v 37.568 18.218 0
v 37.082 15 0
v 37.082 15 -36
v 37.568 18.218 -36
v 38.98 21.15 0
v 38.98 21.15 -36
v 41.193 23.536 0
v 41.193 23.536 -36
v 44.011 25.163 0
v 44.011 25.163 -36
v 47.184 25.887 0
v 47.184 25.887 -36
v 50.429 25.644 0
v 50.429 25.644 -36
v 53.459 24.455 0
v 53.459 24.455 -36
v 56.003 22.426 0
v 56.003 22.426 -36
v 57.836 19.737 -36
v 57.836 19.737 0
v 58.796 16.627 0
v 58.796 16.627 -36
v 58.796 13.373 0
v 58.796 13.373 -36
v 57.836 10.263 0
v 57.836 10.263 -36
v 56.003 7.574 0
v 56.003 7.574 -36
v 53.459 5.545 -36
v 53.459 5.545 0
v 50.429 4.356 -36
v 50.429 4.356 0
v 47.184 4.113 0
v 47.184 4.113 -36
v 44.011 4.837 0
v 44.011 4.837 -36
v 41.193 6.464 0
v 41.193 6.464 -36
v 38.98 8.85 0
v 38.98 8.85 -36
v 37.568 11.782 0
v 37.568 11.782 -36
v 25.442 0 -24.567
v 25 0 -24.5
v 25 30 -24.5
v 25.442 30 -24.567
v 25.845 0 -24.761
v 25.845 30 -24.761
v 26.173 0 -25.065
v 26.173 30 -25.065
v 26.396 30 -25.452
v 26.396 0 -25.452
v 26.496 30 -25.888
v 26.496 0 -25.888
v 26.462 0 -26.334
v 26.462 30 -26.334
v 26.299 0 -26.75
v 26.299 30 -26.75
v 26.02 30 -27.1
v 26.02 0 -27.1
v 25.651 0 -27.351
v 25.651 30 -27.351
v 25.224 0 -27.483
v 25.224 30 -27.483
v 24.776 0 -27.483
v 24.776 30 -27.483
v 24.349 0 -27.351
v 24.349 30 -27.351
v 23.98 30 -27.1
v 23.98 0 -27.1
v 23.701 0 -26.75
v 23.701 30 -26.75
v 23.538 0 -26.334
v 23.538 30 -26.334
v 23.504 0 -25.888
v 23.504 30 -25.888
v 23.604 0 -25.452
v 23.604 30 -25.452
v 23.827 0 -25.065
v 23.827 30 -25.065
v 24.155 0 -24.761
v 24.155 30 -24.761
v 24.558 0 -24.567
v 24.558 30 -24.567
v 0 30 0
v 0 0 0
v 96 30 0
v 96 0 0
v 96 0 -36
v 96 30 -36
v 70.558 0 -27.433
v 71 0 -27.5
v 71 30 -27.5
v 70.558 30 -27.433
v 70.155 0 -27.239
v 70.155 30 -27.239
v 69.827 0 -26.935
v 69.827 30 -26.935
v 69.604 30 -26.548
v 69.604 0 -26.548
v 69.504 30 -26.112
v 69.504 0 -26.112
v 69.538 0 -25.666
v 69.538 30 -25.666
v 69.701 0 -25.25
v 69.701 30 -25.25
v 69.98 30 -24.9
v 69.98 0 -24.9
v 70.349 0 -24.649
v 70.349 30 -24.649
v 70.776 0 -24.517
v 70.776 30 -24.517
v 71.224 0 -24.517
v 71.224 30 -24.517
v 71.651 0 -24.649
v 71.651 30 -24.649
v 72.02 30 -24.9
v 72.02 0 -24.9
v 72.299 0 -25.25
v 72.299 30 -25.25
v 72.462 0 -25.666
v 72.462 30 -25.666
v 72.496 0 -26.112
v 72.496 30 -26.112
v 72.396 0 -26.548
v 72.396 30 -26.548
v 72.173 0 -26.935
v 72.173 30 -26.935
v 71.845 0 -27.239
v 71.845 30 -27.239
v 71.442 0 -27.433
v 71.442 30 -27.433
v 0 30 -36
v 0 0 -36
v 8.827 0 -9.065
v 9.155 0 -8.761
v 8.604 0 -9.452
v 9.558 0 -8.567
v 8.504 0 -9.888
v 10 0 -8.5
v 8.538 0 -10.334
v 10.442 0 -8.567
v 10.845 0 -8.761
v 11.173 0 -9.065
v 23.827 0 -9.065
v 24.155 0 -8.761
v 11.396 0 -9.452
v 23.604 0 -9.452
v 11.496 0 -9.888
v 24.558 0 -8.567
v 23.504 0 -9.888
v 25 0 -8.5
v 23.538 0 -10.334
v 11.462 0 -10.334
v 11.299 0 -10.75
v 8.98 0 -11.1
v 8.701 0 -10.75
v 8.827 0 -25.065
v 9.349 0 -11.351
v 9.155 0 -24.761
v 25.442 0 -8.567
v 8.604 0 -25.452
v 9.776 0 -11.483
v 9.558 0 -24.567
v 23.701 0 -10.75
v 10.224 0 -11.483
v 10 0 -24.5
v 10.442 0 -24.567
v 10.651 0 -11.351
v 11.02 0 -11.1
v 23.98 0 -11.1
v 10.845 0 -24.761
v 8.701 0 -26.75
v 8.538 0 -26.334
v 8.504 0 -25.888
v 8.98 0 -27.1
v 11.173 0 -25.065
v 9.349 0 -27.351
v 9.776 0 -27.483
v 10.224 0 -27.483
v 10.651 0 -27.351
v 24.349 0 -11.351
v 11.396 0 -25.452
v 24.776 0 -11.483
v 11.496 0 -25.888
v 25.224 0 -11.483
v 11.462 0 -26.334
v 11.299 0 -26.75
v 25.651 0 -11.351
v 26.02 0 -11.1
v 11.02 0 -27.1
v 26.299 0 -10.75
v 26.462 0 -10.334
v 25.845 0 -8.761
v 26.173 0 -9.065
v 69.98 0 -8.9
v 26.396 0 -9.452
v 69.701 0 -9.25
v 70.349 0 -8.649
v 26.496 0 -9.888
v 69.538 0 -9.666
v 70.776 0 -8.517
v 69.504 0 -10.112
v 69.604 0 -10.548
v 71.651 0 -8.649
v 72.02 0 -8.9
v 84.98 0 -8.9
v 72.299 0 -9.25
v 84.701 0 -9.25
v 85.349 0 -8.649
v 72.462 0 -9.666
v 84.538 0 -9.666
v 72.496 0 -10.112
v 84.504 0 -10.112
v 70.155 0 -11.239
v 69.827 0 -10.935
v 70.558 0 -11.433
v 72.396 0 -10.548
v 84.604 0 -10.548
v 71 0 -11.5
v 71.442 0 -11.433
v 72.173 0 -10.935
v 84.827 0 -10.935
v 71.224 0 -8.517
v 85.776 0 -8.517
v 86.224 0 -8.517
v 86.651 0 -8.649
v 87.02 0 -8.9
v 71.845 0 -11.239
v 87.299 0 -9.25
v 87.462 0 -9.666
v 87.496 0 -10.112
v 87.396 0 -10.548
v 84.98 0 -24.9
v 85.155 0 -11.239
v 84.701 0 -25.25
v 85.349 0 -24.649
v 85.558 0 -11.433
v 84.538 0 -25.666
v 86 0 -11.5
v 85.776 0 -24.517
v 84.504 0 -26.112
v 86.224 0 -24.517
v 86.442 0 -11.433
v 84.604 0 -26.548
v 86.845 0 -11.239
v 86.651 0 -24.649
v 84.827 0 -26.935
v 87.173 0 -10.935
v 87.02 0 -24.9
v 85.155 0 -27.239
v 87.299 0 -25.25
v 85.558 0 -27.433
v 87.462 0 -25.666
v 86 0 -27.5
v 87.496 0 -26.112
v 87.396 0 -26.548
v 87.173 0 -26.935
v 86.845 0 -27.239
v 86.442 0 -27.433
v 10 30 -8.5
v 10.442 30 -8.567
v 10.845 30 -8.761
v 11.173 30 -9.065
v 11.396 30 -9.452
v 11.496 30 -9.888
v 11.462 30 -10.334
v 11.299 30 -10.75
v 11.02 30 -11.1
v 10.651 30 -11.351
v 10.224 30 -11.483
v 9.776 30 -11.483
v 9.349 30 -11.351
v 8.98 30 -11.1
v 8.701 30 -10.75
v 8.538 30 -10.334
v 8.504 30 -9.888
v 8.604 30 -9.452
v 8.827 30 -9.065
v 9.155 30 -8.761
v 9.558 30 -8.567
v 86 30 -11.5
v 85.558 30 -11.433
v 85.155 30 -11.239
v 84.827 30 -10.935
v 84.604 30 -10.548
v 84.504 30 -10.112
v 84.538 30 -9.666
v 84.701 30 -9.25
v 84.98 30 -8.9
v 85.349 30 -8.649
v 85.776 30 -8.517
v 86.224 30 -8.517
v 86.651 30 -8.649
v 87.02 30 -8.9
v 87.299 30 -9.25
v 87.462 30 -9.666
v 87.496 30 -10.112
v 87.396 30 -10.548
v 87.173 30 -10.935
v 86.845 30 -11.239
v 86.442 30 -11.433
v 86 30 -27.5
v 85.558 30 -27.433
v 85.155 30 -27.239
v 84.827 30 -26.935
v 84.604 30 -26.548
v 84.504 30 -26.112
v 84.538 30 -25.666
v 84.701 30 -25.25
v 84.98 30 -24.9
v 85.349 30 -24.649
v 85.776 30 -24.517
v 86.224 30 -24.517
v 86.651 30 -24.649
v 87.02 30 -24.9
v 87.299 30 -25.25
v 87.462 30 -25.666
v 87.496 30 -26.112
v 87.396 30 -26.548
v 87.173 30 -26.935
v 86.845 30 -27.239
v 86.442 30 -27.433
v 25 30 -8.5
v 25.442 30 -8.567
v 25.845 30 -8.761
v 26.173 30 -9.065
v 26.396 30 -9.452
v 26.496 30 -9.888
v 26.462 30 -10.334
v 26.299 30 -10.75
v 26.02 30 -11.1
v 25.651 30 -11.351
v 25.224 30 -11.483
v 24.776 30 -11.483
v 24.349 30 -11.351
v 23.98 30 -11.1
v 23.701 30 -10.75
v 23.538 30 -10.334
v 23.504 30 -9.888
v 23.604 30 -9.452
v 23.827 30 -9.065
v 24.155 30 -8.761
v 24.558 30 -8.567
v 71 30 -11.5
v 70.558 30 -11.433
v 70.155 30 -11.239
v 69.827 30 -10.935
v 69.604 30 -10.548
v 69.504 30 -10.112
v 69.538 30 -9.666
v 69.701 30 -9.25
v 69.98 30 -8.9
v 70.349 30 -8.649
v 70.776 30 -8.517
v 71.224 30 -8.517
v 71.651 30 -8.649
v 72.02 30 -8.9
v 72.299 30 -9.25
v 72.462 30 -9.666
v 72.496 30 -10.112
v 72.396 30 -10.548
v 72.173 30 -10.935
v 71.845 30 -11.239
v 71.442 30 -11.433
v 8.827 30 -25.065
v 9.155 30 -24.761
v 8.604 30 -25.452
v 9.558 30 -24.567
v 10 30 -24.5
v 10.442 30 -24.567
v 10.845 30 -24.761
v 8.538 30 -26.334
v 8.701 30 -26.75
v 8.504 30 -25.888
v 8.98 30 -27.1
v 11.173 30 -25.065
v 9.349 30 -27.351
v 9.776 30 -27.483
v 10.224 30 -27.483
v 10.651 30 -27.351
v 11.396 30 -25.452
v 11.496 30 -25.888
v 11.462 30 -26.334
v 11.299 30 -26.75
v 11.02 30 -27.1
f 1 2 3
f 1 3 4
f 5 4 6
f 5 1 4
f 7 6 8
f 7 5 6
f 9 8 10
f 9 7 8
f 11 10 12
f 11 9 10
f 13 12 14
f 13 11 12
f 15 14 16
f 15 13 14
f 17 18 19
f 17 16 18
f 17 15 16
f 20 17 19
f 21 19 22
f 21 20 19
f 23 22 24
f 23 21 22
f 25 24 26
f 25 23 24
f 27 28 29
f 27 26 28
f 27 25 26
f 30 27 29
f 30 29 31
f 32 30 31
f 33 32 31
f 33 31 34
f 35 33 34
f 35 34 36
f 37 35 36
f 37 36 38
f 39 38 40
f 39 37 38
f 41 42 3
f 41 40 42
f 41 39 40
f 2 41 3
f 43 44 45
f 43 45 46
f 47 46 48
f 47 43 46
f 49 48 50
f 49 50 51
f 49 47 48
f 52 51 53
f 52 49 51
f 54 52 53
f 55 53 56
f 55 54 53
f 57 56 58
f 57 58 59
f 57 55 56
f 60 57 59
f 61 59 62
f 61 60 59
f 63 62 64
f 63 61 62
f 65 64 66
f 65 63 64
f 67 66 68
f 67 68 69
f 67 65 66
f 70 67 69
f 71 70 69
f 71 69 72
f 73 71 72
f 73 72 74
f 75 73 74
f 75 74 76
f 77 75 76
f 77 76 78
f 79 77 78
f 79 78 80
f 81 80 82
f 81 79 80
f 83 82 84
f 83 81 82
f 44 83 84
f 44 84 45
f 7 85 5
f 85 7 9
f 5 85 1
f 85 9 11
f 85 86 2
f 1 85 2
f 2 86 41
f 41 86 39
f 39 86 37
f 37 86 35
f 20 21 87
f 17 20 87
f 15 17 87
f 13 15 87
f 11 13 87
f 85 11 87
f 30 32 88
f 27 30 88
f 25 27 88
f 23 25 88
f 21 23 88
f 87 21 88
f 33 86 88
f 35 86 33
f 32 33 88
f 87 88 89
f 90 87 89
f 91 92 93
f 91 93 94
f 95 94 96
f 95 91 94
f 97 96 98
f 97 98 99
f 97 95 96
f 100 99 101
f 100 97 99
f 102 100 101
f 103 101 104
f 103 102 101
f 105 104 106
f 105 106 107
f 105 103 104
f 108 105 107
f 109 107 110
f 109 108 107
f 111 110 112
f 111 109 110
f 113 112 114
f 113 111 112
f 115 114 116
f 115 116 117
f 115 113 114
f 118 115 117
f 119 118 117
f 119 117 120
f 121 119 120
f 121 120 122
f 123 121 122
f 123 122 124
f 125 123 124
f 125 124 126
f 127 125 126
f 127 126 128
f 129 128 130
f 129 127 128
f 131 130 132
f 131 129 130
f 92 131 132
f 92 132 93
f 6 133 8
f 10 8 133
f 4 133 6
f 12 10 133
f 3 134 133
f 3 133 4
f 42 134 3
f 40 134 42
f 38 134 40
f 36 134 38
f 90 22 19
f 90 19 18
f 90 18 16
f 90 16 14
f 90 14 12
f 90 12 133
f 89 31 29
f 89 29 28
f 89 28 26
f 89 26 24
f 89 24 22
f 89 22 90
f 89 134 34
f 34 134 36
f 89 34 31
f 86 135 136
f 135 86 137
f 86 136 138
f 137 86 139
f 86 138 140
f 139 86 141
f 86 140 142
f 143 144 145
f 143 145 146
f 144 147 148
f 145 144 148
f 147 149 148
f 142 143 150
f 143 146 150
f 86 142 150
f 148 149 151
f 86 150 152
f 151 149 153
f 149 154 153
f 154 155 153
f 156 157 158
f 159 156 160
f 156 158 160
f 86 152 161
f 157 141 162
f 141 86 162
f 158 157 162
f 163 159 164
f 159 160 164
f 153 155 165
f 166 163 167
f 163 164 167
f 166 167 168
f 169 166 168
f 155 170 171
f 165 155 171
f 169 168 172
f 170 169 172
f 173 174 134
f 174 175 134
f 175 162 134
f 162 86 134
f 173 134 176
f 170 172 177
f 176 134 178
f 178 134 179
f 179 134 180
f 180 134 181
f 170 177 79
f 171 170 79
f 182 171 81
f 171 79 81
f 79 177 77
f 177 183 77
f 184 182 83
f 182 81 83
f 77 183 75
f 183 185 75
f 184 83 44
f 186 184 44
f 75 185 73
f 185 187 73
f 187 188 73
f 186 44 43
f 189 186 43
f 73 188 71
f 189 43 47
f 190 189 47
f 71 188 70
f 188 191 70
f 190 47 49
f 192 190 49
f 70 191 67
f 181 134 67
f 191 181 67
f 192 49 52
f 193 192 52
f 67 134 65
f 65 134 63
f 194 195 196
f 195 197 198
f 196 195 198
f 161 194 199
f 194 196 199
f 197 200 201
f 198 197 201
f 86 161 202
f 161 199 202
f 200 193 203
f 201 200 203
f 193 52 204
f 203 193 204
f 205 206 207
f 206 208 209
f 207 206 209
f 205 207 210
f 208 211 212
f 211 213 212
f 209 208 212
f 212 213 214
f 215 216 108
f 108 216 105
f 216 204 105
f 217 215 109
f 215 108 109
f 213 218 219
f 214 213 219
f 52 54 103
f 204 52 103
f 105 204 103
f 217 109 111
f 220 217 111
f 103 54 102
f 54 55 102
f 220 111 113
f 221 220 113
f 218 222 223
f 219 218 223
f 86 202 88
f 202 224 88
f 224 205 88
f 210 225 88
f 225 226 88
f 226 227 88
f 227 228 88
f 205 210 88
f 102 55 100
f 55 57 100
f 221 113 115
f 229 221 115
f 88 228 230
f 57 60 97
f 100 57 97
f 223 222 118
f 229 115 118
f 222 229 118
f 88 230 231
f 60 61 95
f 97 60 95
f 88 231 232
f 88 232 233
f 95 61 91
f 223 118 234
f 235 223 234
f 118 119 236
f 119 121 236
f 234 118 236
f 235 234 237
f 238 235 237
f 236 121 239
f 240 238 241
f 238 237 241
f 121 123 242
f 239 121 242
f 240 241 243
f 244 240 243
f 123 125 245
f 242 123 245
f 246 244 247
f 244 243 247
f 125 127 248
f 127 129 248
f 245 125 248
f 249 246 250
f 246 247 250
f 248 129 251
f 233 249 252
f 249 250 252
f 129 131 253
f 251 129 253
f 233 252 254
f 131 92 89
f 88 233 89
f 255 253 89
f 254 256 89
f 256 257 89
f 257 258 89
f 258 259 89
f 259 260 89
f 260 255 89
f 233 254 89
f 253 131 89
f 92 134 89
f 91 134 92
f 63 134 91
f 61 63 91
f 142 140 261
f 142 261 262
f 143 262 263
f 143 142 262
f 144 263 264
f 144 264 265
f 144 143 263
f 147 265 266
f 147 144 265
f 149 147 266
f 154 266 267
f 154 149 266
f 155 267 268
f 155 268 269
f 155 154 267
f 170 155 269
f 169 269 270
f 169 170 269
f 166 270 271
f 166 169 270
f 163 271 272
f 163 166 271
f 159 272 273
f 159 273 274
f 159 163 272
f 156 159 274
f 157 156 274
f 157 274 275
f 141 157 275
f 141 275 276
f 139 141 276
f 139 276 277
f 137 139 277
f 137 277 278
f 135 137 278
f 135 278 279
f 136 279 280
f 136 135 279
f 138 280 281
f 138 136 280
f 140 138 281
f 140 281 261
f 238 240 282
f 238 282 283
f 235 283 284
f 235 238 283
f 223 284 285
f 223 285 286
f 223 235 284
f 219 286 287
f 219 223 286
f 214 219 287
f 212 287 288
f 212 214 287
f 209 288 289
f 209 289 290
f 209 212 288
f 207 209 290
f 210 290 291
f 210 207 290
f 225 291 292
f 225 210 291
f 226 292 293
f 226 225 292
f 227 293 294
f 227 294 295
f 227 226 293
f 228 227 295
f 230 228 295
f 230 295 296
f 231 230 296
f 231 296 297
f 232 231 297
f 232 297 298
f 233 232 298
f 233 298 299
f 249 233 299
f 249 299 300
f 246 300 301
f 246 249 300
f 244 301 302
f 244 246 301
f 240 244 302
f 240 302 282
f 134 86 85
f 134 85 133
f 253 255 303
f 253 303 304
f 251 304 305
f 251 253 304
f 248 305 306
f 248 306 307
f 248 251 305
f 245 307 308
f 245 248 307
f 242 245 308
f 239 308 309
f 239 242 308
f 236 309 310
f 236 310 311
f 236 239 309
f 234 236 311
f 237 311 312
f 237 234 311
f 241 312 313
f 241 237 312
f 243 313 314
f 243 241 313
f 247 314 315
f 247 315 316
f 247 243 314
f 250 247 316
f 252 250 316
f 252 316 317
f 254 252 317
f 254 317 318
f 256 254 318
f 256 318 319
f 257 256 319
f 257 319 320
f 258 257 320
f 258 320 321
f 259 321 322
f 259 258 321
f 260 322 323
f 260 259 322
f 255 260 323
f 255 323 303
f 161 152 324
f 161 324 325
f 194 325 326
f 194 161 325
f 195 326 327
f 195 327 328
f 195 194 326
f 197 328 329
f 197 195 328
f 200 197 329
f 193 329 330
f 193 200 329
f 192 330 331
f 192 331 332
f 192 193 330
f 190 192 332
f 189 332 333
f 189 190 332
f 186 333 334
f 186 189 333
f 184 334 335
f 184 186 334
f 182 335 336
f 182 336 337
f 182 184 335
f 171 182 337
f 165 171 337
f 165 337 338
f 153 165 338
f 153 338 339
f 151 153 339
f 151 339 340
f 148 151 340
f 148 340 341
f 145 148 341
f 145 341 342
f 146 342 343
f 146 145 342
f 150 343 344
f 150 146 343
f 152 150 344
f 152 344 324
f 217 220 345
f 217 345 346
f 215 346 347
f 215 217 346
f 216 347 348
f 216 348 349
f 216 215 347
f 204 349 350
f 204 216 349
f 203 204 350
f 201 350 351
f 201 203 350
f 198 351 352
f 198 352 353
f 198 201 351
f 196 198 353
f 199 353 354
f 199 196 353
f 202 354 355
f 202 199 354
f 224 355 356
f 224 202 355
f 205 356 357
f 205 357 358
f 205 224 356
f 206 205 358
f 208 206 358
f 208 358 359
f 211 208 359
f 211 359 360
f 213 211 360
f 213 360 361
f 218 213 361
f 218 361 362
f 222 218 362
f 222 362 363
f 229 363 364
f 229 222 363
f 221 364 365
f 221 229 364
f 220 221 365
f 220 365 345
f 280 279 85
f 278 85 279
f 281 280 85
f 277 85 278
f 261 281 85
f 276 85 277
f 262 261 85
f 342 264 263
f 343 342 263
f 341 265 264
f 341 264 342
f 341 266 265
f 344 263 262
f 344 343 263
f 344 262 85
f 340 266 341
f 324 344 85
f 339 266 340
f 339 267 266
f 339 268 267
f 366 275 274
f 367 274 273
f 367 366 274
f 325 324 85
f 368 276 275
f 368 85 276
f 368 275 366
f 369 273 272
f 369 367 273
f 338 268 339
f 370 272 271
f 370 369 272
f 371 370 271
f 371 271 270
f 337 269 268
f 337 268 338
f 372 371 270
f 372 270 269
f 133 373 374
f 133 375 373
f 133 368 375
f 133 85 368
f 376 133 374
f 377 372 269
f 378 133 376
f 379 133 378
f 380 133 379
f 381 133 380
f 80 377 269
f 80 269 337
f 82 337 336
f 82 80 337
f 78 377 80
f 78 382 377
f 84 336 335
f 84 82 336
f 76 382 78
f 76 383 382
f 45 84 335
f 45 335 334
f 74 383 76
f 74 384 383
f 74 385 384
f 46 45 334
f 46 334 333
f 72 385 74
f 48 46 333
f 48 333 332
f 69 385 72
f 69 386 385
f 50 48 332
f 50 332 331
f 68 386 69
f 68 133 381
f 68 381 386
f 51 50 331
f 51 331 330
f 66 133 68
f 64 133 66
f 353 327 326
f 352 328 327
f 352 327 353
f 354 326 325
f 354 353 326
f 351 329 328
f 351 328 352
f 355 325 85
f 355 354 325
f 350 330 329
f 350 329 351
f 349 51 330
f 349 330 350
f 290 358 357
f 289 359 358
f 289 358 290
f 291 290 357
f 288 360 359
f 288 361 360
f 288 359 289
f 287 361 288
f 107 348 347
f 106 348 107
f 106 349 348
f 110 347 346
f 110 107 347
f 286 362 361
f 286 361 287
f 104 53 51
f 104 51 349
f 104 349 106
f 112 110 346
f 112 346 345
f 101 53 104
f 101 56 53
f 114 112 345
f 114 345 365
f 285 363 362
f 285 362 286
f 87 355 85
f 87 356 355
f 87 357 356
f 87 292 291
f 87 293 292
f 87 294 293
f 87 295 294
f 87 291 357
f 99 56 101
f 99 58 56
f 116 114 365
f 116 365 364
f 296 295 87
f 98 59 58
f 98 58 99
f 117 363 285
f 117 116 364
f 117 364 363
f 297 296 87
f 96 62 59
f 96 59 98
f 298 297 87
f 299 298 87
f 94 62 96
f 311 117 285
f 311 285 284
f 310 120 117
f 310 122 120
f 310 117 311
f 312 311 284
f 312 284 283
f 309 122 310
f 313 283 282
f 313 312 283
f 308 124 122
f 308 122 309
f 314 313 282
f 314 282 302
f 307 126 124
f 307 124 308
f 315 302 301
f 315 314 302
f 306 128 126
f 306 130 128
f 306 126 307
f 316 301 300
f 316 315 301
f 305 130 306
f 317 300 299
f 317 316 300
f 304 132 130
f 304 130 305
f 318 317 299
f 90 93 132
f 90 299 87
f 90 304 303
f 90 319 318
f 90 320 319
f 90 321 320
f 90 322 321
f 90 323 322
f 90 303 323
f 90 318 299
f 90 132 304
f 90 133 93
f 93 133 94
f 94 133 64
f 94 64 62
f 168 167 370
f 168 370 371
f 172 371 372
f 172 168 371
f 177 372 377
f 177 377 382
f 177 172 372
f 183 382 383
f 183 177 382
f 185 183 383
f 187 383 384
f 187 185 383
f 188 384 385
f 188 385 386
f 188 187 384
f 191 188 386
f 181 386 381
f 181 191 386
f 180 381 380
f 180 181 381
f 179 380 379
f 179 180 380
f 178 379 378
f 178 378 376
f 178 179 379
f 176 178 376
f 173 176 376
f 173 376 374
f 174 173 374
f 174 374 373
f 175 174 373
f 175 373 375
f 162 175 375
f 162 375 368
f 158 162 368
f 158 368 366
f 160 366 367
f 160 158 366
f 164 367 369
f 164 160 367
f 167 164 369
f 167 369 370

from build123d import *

# Parameters (mm, degrees)
SKETCH_1_W               = 96
SKETCH_1_H               = 36
SKETCH_1_R               = 1.5
EXTRUDE_1_DEPTH          = 30
CUT_EXTRUDE_1_DEPTH      = 107.826962889
CUT_EXTRUDE_1_DEPTH_BACK = 107.826962889
SKETCH_2_R               = 10.917502173


with BuildPart() as part:
    # 草图1 → 凸台-拉伸1 (new body)
    with BuildSketch(Plane(origin=(0, 0, 0), x_dir=(1, 0, 0), z_dir=(0, 1, 0))):
        with Locations((48, 18)):
            Rectangle(SKETCH_1_W, SKETCH_1_H)
        with Locations(Location((10, 26, 0), (0, 0, 270))):
            Circle(SKETCH_1_R, mode=Mode.SUBTRACT)
        with Locations(Location((25, 26, 0), (0, 0, 270))):
            Circle(SKETCH_1_R, mode=Mode.SUBTRACT)
        with Locations(Location((25, 10, 0), (0, 0, 270))):
            Circle(SKETCH_1_R, mode=Mode.SUBTRACT)
        with Locations(Location((10, 10, 0), (0, 0, 270))):
            Circle(SKETCH_1_R, mode=Mode.SUBTRACT)
        with Locations(Location((86, 26, 0), (0, 0, 90))):
            Circle(SKETCH_1_R, mode=Mode.SUBTRACT)
        with Locations(Location((86, 10, 0), (0, 0, 90))):
            Circle(SKETCH_1_R, mode=Mode.SUBTRACT)
        with Locations(Location((71, 10, 0), (0, 0, 90))):
            Circle(SKETCH_1_R, mode=Mode.SUBTRACT)
        with Locations(Location((71, 26, 0), (0, 0, 90))):
            Circle(SKETCH_1_R, mode=Mode.SUBTRACT)
    extrude(amount=EXTRUDE_1_DEPTH)

    # 草图2 → 切除-拉伸1 (cut, two sides: drawn at the far end of the back side and taken through both)
    with BuildSketch(Plane(origin=(0, 0, -36), x_dir=(-1, 0, 0), z_dir=(0, 0, -1)).offset(-CUT_EXTRUDE_1_DEPTH_BACK)):
        with Locations((-48, 15)):
            Circle(SKETCH_2_R)
    extrude(amount=CUT_EXTRUDE_1_DEPTH + CUT_EXTRUDE_1_DEPTH_BACK, mode=Mode.SUBTRACT)


solid = part.part
